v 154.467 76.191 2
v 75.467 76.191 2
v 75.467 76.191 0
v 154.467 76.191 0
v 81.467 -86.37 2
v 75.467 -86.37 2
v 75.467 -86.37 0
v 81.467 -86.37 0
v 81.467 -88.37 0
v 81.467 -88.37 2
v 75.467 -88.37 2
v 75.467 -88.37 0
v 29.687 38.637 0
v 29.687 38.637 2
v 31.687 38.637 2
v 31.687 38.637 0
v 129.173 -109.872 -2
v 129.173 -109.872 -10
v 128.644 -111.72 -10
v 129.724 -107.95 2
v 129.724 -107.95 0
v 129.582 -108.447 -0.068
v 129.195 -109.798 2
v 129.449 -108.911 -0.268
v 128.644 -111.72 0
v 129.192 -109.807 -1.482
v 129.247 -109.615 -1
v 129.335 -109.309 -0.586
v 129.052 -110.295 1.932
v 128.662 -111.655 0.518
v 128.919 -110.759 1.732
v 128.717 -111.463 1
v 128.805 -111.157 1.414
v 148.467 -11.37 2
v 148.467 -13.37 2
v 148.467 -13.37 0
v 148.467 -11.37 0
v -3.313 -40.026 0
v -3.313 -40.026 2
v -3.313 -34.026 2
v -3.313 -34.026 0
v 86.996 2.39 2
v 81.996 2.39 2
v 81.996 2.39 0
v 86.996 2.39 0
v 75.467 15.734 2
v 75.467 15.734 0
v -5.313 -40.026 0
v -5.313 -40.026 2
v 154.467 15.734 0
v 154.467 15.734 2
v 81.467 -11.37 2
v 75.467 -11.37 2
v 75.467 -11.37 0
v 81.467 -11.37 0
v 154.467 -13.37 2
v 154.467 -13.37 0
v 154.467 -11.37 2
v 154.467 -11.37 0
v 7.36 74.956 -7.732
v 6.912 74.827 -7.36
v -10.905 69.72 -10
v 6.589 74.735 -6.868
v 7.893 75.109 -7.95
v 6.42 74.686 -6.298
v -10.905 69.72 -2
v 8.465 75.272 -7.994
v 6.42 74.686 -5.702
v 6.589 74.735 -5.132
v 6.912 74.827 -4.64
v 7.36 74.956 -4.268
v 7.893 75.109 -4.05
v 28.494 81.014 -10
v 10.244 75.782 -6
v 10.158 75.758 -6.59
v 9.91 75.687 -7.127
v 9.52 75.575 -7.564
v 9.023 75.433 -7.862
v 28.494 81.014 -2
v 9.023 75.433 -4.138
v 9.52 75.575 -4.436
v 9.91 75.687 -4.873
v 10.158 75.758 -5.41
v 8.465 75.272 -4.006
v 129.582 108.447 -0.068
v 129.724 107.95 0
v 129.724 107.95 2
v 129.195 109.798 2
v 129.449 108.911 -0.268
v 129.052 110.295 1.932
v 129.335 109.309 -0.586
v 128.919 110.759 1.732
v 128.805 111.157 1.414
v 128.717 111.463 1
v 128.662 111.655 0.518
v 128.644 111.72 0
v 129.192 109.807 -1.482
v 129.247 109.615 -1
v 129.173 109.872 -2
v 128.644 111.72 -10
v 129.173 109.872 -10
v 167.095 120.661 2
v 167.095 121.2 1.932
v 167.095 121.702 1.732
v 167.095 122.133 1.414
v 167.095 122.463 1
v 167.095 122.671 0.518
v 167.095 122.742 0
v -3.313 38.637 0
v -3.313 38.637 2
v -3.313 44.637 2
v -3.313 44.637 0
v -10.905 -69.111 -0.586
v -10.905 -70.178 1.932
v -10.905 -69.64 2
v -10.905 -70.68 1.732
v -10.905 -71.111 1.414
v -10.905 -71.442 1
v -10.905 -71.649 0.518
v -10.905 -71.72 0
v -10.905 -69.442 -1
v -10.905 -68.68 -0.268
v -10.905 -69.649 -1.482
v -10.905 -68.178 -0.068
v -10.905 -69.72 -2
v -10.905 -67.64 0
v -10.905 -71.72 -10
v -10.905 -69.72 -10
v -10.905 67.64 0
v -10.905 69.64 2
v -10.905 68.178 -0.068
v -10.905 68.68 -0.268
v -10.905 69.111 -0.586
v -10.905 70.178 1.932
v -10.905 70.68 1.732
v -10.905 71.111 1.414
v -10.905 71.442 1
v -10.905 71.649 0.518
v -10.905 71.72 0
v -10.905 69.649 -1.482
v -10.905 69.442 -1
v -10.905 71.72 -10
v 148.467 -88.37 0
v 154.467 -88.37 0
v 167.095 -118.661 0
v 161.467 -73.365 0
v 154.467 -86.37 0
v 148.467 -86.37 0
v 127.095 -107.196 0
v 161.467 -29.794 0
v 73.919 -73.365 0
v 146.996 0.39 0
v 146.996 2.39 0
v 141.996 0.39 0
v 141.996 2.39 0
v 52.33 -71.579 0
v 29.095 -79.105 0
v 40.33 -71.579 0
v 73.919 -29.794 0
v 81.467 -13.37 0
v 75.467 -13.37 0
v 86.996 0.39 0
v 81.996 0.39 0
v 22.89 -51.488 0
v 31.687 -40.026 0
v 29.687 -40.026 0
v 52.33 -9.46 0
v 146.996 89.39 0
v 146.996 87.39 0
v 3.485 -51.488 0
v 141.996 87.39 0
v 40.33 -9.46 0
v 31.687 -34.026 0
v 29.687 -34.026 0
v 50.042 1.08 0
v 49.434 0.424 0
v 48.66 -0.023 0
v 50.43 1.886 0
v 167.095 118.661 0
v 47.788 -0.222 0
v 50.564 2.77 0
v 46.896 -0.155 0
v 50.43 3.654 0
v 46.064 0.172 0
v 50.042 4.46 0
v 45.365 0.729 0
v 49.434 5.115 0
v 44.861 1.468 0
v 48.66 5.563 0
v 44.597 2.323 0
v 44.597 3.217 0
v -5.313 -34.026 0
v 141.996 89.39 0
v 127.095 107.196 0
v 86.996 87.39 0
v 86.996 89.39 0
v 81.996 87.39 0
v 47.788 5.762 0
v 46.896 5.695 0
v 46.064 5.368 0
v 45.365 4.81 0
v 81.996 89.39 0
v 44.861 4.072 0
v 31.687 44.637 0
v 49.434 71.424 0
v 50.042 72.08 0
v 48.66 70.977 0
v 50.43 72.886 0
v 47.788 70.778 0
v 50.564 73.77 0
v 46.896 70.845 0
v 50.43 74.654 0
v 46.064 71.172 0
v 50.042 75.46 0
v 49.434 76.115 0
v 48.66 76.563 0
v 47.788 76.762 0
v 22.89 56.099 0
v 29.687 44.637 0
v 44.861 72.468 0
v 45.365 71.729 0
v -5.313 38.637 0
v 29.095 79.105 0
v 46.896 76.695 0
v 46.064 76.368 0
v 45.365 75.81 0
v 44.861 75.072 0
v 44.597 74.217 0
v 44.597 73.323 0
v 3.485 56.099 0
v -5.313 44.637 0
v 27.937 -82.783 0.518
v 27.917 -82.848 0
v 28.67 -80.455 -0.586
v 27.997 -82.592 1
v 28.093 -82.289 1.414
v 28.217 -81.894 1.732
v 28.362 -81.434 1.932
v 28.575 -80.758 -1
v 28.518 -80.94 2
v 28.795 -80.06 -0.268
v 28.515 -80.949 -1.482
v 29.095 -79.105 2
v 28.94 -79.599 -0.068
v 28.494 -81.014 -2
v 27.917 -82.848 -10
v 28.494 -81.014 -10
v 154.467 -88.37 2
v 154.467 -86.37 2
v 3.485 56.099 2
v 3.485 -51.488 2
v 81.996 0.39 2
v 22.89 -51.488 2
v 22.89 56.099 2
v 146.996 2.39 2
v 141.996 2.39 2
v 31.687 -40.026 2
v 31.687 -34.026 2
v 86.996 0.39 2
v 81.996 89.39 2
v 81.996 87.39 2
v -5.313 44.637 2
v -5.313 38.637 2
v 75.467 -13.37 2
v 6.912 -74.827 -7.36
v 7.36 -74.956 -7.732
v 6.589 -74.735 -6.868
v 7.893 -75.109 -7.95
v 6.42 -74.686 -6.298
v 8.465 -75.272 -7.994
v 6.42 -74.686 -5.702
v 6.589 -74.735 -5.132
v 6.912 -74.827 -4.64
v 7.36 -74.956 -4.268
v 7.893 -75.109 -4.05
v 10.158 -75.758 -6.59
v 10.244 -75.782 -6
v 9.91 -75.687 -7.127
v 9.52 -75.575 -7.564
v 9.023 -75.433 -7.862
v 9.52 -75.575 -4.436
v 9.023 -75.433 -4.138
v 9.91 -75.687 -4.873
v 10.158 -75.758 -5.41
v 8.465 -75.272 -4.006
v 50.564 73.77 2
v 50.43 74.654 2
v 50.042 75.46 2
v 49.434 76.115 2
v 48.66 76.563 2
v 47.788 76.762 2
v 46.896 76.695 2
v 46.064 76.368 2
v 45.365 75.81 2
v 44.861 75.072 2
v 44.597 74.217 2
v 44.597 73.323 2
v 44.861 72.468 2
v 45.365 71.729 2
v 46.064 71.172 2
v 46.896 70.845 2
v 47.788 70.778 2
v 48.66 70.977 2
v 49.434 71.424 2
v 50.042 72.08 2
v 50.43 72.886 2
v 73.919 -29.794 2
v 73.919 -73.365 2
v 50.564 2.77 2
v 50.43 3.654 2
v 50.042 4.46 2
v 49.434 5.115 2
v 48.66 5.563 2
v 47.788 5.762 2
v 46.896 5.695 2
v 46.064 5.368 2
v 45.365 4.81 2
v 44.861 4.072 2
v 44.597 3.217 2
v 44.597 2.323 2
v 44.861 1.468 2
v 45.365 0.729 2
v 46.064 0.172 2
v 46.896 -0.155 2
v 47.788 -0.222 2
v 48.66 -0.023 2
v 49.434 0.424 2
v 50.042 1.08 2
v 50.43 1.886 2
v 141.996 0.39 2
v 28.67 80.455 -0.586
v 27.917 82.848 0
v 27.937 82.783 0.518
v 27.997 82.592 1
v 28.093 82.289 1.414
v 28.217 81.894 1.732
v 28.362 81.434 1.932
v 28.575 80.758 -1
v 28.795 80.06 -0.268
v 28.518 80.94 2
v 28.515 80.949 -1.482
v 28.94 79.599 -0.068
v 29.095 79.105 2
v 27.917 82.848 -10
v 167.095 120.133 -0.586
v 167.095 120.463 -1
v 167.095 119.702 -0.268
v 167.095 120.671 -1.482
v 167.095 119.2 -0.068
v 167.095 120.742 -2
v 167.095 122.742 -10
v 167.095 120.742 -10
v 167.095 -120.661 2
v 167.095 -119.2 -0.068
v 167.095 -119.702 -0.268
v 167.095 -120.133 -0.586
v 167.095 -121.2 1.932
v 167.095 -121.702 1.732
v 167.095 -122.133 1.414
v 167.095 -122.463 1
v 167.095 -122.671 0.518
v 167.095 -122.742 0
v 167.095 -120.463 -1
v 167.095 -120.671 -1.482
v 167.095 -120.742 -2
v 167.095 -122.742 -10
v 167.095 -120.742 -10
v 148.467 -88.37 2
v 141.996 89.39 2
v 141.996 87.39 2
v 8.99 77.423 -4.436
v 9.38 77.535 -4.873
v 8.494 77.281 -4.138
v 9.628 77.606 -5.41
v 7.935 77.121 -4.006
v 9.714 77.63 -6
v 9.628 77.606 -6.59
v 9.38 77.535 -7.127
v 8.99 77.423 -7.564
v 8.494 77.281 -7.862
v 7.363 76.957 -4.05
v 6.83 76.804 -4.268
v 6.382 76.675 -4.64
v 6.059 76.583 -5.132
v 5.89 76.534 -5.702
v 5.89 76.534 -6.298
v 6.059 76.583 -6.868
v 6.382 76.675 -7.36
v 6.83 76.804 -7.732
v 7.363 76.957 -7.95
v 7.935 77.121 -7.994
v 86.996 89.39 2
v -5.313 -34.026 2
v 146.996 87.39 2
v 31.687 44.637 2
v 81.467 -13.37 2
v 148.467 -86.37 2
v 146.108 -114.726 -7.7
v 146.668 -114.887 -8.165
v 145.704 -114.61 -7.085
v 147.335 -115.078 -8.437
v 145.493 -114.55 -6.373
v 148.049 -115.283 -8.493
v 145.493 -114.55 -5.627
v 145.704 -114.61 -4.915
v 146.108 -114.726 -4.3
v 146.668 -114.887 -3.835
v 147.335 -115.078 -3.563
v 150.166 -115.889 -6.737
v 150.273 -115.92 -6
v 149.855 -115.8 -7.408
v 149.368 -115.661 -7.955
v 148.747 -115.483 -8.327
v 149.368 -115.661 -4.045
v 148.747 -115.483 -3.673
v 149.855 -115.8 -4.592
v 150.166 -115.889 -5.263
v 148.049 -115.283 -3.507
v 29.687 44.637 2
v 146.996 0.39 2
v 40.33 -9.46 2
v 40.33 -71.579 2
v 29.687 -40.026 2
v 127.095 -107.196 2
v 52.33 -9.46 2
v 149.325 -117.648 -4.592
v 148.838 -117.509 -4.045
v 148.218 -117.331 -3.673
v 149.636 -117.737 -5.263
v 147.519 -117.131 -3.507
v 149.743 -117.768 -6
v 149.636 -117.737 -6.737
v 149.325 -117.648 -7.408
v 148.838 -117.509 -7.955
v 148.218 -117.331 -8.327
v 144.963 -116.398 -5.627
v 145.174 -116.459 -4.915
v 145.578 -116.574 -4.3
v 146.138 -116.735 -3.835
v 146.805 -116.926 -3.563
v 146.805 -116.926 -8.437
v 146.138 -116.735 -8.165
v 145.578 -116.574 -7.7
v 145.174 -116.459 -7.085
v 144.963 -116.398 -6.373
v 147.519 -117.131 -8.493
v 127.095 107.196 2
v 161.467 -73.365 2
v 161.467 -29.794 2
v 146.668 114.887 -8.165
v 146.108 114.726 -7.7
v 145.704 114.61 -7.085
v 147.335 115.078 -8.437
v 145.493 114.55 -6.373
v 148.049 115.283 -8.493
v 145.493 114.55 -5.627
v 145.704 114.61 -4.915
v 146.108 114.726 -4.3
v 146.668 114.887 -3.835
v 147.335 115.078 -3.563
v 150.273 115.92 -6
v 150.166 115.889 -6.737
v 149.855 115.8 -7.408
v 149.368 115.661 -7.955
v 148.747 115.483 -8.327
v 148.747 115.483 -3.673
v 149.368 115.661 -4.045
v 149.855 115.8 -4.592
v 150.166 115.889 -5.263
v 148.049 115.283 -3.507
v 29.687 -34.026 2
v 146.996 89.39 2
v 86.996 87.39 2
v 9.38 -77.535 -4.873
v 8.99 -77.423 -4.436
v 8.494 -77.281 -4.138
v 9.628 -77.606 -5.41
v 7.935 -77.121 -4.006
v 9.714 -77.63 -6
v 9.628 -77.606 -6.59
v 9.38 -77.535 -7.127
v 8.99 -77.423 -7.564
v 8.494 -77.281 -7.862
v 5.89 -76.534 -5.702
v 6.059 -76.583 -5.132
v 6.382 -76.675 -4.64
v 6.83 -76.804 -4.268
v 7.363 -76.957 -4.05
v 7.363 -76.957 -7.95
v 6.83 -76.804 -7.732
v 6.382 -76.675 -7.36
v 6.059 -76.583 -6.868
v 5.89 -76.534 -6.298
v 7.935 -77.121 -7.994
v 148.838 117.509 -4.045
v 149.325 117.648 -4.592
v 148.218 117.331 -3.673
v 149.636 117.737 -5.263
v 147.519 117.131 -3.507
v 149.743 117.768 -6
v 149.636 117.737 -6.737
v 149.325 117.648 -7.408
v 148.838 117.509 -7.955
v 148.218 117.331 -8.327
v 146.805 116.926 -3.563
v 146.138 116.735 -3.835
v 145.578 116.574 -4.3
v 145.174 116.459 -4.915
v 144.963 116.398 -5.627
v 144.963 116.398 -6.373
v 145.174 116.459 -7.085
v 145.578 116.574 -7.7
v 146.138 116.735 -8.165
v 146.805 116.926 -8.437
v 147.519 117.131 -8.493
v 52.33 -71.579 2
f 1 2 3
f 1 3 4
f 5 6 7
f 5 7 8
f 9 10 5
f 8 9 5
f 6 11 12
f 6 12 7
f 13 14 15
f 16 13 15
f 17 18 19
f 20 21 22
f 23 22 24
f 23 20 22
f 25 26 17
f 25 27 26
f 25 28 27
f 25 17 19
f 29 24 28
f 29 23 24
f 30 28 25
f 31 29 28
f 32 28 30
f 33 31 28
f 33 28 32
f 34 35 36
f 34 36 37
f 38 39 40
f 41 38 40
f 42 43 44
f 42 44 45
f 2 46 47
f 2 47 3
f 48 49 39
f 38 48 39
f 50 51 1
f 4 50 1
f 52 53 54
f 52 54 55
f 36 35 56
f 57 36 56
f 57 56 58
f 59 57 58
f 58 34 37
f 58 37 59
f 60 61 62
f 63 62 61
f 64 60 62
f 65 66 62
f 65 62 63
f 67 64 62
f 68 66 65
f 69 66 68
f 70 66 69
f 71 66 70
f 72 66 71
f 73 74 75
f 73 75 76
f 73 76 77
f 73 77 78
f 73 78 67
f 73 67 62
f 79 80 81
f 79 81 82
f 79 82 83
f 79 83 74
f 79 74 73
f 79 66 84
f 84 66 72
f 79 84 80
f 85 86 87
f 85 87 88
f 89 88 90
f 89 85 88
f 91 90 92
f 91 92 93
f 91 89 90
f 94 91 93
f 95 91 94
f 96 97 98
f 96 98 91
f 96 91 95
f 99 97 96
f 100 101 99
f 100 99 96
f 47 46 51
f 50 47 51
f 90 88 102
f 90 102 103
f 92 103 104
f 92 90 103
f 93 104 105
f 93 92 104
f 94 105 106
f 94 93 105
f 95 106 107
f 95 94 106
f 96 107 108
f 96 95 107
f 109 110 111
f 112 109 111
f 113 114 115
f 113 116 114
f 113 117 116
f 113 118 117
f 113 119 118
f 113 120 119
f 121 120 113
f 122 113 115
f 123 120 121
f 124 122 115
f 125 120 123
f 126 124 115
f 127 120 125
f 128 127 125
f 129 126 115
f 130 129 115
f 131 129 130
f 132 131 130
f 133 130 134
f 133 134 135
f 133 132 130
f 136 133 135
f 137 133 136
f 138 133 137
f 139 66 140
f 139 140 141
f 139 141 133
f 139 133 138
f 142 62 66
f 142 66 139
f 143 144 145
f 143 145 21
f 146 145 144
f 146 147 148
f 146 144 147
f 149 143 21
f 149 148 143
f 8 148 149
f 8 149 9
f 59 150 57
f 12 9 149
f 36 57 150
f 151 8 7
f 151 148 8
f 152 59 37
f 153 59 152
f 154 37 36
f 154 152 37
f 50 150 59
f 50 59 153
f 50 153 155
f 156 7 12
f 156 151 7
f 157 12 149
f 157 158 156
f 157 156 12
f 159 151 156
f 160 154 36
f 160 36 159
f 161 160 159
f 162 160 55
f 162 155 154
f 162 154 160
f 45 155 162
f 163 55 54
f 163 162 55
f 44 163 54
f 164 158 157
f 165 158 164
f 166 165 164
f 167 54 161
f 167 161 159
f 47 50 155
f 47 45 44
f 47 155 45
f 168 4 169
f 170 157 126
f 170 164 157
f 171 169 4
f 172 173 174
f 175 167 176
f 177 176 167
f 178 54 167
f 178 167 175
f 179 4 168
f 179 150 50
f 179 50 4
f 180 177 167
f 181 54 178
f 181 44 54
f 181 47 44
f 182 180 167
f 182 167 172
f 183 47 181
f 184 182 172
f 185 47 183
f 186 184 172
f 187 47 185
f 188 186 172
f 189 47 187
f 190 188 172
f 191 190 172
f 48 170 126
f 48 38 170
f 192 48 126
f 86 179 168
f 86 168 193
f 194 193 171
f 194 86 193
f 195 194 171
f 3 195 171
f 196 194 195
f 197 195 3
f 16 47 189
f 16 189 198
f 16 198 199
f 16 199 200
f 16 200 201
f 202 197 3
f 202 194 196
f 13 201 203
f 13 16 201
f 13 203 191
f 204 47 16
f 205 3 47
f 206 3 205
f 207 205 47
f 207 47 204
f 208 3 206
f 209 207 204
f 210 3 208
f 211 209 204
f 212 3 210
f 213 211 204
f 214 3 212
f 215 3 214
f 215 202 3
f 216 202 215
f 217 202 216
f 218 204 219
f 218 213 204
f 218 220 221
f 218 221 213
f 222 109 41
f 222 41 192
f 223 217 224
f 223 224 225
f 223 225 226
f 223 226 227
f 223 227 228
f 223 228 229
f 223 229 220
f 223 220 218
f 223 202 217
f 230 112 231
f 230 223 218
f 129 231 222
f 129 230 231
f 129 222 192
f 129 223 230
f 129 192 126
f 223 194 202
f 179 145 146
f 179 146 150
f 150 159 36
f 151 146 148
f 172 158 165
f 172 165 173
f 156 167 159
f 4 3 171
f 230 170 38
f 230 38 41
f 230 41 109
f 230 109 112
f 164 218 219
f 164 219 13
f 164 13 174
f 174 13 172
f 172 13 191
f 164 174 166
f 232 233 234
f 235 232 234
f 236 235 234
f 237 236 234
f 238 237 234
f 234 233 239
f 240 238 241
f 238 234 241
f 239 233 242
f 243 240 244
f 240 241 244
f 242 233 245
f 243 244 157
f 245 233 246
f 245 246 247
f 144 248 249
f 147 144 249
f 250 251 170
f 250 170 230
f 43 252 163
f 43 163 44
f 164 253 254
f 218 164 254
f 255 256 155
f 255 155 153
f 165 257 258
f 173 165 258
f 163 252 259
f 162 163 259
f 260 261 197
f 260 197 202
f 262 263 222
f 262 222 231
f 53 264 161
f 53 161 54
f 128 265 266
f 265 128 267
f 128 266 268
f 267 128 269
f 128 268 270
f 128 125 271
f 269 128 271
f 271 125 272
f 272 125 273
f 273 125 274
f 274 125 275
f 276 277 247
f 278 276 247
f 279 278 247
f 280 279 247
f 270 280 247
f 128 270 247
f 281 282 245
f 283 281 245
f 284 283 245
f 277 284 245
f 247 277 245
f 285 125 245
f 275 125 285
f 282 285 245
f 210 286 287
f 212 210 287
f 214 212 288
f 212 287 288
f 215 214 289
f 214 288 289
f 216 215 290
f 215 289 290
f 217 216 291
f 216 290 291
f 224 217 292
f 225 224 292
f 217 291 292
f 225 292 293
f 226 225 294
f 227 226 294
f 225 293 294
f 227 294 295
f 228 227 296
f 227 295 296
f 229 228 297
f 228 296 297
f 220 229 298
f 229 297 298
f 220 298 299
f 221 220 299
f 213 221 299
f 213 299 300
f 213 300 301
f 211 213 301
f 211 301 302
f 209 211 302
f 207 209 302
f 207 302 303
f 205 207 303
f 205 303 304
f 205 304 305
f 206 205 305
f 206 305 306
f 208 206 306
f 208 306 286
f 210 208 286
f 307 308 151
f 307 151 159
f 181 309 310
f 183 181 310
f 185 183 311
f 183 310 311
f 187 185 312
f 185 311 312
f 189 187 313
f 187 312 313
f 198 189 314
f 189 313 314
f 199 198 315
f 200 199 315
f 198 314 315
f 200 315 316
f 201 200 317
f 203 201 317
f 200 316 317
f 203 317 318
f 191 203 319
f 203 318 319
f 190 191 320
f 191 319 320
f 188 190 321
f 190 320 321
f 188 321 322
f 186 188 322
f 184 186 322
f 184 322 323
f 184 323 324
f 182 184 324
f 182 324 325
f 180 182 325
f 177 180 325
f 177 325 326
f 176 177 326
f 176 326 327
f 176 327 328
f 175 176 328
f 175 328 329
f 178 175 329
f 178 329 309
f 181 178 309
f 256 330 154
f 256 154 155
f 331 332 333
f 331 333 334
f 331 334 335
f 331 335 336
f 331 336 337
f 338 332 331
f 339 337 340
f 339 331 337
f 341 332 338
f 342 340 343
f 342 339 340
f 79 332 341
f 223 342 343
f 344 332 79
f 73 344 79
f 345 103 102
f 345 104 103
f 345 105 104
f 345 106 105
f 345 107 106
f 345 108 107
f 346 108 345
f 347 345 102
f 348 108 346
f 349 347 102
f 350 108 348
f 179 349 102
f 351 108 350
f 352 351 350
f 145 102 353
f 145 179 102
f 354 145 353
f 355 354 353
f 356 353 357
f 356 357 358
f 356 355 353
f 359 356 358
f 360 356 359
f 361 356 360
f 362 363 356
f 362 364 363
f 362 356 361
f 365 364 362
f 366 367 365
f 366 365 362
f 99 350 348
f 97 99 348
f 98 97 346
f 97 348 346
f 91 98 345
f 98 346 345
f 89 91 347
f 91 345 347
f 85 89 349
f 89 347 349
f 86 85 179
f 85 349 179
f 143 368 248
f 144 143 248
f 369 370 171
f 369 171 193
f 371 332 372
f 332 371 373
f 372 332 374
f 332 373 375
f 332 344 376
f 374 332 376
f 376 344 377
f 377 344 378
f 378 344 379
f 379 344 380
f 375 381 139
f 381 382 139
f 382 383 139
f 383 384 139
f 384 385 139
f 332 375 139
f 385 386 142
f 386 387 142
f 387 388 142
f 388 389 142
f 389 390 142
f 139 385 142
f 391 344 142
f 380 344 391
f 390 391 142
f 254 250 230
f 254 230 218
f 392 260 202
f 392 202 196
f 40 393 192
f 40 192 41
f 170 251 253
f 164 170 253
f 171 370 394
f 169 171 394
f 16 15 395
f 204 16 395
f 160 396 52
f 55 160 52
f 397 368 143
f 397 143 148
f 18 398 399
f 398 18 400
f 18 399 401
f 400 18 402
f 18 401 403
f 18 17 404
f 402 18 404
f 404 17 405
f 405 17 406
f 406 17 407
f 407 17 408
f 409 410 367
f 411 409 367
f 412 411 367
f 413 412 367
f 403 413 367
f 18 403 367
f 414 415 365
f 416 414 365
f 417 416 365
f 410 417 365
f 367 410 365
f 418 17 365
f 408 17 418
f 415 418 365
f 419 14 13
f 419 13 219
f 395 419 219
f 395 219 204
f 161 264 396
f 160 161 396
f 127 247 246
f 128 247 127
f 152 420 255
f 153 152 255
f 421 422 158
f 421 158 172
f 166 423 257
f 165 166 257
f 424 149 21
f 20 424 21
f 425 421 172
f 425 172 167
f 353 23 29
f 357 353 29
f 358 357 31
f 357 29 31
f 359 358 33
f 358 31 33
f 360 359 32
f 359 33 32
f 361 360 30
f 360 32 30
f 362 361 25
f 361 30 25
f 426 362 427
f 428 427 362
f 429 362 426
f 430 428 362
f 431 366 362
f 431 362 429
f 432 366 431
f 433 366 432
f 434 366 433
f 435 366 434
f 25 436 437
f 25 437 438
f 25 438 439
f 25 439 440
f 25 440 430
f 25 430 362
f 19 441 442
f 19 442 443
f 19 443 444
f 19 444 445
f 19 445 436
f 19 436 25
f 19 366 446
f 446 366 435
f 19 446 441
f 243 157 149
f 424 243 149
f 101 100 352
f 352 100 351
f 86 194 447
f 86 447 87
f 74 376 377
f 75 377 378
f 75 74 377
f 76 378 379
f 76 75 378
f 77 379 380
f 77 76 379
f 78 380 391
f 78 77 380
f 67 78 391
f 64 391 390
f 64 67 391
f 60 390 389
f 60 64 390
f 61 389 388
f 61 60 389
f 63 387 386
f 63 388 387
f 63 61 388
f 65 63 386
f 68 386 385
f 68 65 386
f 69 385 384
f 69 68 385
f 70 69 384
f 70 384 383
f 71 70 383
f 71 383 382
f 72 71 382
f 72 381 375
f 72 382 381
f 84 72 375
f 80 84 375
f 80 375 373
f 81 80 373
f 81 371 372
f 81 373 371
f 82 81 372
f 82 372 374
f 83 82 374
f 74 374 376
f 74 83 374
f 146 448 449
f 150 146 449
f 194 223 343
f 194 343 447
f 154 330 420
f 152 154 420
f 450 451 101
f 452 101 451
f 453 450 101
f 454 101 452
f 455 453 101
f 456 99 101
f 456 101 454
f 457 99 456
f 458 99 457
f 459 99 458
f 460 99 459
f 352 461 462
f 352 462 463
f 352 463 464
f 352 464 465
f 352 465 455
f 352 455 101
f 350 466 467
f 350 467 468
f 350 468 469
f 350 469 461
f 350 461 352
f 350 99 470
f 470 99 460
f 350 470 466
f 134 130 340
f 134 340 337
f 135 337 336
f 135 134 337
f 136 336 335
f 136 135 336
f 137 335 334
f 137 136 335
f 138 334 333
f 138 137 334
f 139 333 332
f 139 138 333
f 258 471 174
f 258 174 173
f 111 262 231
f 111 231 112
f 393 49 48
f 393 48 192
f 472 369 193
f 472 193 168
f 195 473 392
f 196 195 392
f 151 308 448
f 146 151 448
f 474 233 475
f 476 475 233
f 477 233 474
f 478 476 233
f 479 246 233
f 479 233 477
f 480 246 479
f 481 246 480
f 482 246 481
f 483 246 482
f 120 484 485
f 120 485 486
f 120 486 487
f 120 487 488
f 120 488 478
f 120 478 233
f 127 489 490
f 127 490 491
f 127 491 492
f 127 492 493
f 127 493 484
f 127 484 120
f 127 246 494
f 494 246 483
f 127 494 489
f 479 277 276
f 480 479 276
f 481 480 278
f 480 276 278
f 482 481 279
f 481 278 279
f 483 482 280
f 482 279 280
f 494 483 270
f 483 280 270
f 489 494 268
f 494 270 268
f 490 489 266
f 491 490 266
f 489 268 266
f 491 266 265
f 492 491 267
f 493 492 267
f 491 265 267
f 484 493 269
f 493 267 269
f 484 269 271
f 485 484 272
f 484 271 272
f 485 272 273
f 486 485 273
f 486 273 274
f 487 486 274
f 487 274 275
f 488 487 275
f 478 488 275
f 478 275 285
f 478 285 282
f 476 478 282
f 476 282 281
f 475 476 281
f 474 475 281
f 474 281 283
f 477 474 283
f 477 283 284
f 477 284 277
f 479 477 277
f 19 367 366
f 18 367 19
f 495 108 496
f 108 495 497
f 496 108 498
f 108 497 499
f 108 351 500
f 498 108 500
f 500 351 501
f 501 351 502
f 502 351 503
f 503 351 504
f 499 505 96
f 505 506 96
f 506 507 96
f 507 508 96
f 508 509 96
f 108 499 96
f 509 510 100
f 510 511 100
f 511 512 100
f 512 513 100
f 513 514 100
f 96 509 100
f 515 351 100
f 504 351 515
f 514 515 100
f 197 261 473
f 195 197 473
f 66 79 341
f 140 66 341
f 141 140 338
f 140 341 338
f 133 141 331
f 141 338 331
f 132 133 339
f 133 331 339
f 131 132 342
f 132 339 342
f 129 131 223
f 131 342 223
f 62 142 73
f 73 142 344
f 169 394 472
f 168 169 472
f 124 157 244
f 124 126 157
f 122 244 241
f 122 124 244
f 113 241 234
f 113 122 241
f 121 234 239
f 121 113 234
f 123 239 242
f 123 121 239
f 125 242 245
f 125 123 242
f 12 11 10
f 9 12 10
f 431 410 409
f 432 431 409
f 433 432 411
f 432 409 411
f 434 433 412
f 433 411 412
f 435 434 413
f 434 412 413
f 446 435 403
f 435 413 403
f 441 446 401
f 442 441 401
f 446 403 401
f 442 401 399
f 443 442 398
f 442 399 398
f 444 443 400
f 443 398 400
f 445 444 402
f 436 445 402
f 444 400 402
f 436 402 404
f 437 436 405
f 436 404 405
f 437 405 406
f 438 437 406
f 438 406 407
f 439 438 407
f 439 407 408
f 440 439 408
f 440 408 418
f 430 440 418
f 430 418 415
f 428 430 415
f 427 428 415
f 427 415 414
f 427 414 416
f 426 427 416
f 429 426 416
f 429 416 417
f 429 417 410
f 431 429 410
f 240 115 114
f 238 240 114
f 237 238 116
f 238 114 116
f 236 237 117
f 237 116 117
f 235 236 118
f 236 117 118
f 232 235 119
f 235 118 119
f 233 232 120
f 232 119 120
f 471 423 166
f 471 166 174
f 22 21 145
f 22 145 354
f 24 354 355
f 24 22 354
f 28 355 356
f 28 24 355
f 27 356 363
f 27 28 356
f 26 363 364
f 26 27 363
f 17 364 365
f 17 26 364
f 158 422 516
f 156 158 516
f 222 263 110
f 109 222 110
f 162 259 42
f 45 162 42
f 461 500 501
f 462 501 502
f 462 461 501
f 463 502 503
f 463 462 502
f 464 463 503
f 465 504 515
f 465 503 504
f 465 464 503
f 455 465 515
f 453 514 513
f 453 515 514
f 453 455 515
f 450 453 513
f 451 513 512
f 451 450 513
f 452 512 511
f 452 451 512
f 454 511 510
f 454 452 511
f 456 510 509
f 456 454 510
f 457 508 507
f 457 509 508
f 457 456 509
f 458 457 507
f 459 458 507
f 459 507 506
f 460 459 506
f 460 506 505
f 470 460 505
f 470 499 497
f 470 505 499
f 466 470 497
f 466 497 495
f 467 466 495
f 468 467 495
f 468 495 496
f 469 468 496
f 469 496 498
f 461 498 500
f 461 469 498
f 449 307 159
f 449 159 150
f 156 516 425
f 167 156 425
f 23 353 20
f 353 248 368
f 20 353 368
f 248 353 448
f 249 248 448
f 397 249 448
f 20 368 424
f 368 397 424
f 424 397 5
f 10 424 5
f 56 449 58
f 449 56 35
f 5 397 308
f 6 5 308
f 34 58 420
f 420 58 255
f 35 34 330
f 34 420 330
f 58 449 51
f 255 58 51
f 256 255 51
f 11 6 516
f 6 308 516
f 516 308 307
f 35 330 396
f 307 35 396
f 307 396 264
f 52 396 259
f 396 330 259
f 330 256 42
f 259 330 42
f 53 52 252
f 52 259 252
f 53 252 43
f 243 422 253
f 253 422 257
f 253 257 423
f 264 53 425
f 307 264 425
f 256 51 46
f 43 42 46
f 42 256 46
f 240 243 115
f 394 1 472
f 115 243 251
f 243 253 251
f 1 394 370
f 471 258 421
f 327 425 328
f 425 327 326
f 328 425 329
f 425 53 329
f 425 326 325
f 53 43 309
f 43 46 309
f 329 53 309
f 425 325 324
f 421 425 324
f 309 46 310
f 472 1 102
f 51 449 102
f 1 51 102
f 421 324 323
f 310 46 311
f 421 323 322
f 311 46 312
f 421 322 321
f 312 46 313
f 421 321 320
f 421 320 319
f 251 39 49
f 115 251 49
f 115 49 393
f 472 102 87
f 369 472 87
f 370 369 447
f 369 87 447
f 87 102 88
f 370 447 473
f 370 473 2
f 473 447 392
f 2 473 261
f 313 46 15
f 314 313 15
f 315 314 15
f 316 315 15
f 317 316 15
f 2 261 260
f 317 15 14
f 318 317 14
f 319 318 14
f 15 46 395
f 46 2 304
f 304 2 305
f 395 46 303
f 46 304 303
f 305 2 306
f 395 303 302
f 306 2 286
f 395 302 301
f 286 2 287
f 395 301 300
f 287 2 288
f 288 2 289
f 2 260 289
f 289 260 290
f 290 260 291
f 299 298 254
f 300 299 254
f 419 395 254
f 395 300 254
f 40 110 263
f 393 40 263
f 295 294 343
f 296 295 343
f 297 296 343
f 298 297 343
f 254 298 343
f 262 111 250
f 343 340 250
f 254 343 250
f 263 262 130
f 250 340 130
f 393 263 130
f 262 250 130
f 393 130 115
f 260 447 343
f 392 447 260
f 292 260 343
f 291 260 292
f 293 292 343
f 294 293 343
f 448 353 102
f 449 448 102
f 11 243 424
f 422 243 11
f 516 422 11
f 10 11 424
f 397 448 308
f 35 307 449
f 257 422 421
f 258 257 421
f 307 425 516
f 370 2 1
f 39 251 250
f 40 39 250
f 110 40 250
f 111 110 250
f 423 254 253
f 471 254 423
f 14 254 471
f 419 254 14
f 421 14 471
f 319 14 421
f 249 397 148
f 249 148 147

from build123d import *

# Parameters (mm, degrees)
BOSS_EXTRUDE1_DEPTH      = 2
SKETCH2_R                = 3
SKETCH2_W                = 2
SKETCH2_H                = 6
SKETCH2_W_2              = 19.404886506
SKETCH2_H_2              = 107.587058951
SKETCH2_W_3              = 12
SKETCH2_H_3              = 62.119371688
SKETCH2_W_4              = 6
SKETCH2_H_4              = 2
SKETCH2_W_5              = 5
SKETCH2_W_6              = 87.5481705
SKETCH2_H_5              = 43.571241204
SKETCH2_W_7              = 79
SKETCH2_H_6              = 60.456746524
CUT_EXTRUDE1_DEPTH       = 10
BOSS_EXTRUDE2_DEPTH      = 10
BOSS_EXTRUDE2_DEPTH_BACK = 2
FILLET1_R                = 2
CUT_EXTRUDE2_DEPTH       = 10
CUT_EXTRUDE2_DEPTH_BACK  = 10
SKETCH5_R                = 2.5
SKETCH5_R_2              = 2
CUT_EXTRUDE3_DEPTH       = 10


with BuildPart() as part:
    # Sketch1 → Boss-Extrude1 (new body)
    with BuildSketch(Plane.XY):
        Polygon((-10.904784398, -69.72039113), (-10.904784398, 69.72039113), (167.095215602, 120.741927431), (167.095215602, -120.741927431), align=None)
    extrude(amount=BOSS_EXTRUDE1_DEPTH)

    # Sketch2 → Cut-Extrude1 (cut)
    with BuildSketch(Plane.XY.offset(2)):
        with Locations((47.563666615, 2.7699494)):
            Circle(SKETCH2_R)
        with Locations((47.563666615, 73.7699494)):
            Circle(SKETCH2_R)
        with Locations((30.687477401, 41.636914827)):
            Rectangle(SKETCH2_W, SKETCH2_H)
        with Locations((30.687477401, -37.025532441)):
            Rectangle(SKETCH2_W, SKETCH2_H)
        with Locations((-4.312522599, 41.636914827)):
            Rectangle(SKETCH2_W, SKETCH2_H)
        with Locations((-4.312522599, -37.025532441)):
            Rectangle(SKETCH2_W, SKETCH2_H)
        with Locations((13.187477401, 2.305691192)):
            Rectangle(SKETCH2_W_2, SKETCH2_H_2)
        with Locations((46.32953553, -40.519587511)):
            Rectangle(SKETCH2_W_3, SKETCH2_H_3)
        with Locations((78.467345618, -87.370243237)):
            Rectangle(SKETCH2_W_4, SKETCH2_H_4)
        with Locations((78.467345618, -12.370243237)):
            Rectangle(SKETCH2_W_4, SKETCH2_H_4)
        with Locations((151.467345618, -87.370243237)):
            Rectangle(SKETCH2_W_4, SKETCH2_H_4)
        with Locations((151.467345618, -12.370243237)):
            Rectangle(SKETCH2_W_4, SKETCH2_H_4)
        with Locations((84.496263797, 1.389968406)):
            Rectangle(SKETCH2_W_5, SKETCH2_H_4)
        with Locations((84.496263797, 88.389968406)):
            Rectangle(SKETCH2_W_5, SKETCH2_H_4)
        with Locations((144.496263797, 88.389968406)):
            Rectangle(SKETCH2_W_5, SKETCH2_H_4)
        with Locations((144.496263797, 1.389968406)):
            Rectangle(SKETCH2_W_5, SKETCH2_H_4)
        with Locations((117.693260368, -51.579694355)):
            Rectangle(SKETCH2_W_6, SKETCH2_H_5)
        with Locations((114.967345618, 45.962282478)):
            Rectangle(SKETCH2_W_7, SKETCH2_H_6)
    extrude(amount=-CUT_EXTRUDE1_DEPTH, mode=Mode.SUBTRACT)

    # Sketch3 → Boss-Extrude2 (add, two sides: drawn at the far end of the back side and taken through both)
    with BuildSketch(Plane(origin=(0, 0, 0), x_dir=(-1, 0, 0), z_dir=(0, 0, -1)).offset(-BOSS_EXTRUDE2_DEPTH_BACK)):
        Polygon((10.904784398, -69.72039113), (-167.095215602, -120.741927431), (-167.095215602, -122.741927431), (10.904784398, -71.72039113), align=None)
        Polygon((-167.095215602, 120.741927431), (-167.095215602, 122.741927431), (10.904784398, 71.72039113), (10.904784398, 69.72039113), align=None)
    extrude(amount=BOSS_EXTRUDE2_DEPTH + BOSS_EXTRUDE2_DEPTH_BACK)

    # Fillet1
    fillet1_edges = [part.edges().sort_by_distance(p)[0] for p in [
        (78.095215602, 95.231159281, 0),
        (78.095215602, -95.231159281, 0),
        (78.095215602, -97.231159281, 2),
        (78.095215602, 97.231159281, 2),
    ]]
    fillet(fillet1_edges, radius=FILLET1_R)

    # Sketch4 → Cut-Extrude2 (cut, two sides: drawn at the far end of the back side and taken through both)
    with BuildSketch(Plane(origin=(0, 0, 0), x_dir=(-1, 0, 0), z_dir=(0, 0, -1)).offset(-CUT_EXTRUDE2_DEPTH_BACK)):
        Polygon((-29.095215602, 79.105365308), (-127.095215602, 107.195874059), (-129.724486678, 107.949522652), (-128.643652311, 111.720254216), (-128.09256865, 113.642832381), (-127.51525552, 115.656917896), (-124.890880959, 114.886186717), (-26.890880959, 86.105365308), align=None)
        Polygon((-127.095215602, -107.195874059), (-129.724486678, -107.949522652), (-128.643652311, -111.720254216), (-128.09256865, -113.642832381), (-127.51525552, -115.656917896), (-124.890880959, -114.886186717), (-26.890880959, -86.105365308), (-29.095215602, -79.105365308), align=None)
    extrude(amount=CUT_EXTRUDE2_DEPTH + CUT_EXTRUDE2_DEPTH_BACK, mode=Mode.SUBTRACT)

    # Sketch5 → Cut-Extrude3 (cut)
    with BuildSketch(Plane(origin=(-19.29514045, -67.315397557, 0), x_dir=(0.9612890822794596, -0.27554183038209346, 0), z_dir=(0.2755418303820934, 0.9612890822794595, 0))):
        with Locations((173.896258148, 6)):
            Circle(SKETCH5_R)
        with Locations((28.728234, 6)):
            Circle(SKETCH5_R_2)
    cut_extrude3 = extrude(amount=-CUT_EXTRUDE3_DEPTH, mode=Mode.SUBTRACT)

    # Mirror1: Cut-Extrude3 across plane
    add(cut_extrude3.mirror(Plane.ZX), mode=Mode.SUBTRACT)


solid = part.part
